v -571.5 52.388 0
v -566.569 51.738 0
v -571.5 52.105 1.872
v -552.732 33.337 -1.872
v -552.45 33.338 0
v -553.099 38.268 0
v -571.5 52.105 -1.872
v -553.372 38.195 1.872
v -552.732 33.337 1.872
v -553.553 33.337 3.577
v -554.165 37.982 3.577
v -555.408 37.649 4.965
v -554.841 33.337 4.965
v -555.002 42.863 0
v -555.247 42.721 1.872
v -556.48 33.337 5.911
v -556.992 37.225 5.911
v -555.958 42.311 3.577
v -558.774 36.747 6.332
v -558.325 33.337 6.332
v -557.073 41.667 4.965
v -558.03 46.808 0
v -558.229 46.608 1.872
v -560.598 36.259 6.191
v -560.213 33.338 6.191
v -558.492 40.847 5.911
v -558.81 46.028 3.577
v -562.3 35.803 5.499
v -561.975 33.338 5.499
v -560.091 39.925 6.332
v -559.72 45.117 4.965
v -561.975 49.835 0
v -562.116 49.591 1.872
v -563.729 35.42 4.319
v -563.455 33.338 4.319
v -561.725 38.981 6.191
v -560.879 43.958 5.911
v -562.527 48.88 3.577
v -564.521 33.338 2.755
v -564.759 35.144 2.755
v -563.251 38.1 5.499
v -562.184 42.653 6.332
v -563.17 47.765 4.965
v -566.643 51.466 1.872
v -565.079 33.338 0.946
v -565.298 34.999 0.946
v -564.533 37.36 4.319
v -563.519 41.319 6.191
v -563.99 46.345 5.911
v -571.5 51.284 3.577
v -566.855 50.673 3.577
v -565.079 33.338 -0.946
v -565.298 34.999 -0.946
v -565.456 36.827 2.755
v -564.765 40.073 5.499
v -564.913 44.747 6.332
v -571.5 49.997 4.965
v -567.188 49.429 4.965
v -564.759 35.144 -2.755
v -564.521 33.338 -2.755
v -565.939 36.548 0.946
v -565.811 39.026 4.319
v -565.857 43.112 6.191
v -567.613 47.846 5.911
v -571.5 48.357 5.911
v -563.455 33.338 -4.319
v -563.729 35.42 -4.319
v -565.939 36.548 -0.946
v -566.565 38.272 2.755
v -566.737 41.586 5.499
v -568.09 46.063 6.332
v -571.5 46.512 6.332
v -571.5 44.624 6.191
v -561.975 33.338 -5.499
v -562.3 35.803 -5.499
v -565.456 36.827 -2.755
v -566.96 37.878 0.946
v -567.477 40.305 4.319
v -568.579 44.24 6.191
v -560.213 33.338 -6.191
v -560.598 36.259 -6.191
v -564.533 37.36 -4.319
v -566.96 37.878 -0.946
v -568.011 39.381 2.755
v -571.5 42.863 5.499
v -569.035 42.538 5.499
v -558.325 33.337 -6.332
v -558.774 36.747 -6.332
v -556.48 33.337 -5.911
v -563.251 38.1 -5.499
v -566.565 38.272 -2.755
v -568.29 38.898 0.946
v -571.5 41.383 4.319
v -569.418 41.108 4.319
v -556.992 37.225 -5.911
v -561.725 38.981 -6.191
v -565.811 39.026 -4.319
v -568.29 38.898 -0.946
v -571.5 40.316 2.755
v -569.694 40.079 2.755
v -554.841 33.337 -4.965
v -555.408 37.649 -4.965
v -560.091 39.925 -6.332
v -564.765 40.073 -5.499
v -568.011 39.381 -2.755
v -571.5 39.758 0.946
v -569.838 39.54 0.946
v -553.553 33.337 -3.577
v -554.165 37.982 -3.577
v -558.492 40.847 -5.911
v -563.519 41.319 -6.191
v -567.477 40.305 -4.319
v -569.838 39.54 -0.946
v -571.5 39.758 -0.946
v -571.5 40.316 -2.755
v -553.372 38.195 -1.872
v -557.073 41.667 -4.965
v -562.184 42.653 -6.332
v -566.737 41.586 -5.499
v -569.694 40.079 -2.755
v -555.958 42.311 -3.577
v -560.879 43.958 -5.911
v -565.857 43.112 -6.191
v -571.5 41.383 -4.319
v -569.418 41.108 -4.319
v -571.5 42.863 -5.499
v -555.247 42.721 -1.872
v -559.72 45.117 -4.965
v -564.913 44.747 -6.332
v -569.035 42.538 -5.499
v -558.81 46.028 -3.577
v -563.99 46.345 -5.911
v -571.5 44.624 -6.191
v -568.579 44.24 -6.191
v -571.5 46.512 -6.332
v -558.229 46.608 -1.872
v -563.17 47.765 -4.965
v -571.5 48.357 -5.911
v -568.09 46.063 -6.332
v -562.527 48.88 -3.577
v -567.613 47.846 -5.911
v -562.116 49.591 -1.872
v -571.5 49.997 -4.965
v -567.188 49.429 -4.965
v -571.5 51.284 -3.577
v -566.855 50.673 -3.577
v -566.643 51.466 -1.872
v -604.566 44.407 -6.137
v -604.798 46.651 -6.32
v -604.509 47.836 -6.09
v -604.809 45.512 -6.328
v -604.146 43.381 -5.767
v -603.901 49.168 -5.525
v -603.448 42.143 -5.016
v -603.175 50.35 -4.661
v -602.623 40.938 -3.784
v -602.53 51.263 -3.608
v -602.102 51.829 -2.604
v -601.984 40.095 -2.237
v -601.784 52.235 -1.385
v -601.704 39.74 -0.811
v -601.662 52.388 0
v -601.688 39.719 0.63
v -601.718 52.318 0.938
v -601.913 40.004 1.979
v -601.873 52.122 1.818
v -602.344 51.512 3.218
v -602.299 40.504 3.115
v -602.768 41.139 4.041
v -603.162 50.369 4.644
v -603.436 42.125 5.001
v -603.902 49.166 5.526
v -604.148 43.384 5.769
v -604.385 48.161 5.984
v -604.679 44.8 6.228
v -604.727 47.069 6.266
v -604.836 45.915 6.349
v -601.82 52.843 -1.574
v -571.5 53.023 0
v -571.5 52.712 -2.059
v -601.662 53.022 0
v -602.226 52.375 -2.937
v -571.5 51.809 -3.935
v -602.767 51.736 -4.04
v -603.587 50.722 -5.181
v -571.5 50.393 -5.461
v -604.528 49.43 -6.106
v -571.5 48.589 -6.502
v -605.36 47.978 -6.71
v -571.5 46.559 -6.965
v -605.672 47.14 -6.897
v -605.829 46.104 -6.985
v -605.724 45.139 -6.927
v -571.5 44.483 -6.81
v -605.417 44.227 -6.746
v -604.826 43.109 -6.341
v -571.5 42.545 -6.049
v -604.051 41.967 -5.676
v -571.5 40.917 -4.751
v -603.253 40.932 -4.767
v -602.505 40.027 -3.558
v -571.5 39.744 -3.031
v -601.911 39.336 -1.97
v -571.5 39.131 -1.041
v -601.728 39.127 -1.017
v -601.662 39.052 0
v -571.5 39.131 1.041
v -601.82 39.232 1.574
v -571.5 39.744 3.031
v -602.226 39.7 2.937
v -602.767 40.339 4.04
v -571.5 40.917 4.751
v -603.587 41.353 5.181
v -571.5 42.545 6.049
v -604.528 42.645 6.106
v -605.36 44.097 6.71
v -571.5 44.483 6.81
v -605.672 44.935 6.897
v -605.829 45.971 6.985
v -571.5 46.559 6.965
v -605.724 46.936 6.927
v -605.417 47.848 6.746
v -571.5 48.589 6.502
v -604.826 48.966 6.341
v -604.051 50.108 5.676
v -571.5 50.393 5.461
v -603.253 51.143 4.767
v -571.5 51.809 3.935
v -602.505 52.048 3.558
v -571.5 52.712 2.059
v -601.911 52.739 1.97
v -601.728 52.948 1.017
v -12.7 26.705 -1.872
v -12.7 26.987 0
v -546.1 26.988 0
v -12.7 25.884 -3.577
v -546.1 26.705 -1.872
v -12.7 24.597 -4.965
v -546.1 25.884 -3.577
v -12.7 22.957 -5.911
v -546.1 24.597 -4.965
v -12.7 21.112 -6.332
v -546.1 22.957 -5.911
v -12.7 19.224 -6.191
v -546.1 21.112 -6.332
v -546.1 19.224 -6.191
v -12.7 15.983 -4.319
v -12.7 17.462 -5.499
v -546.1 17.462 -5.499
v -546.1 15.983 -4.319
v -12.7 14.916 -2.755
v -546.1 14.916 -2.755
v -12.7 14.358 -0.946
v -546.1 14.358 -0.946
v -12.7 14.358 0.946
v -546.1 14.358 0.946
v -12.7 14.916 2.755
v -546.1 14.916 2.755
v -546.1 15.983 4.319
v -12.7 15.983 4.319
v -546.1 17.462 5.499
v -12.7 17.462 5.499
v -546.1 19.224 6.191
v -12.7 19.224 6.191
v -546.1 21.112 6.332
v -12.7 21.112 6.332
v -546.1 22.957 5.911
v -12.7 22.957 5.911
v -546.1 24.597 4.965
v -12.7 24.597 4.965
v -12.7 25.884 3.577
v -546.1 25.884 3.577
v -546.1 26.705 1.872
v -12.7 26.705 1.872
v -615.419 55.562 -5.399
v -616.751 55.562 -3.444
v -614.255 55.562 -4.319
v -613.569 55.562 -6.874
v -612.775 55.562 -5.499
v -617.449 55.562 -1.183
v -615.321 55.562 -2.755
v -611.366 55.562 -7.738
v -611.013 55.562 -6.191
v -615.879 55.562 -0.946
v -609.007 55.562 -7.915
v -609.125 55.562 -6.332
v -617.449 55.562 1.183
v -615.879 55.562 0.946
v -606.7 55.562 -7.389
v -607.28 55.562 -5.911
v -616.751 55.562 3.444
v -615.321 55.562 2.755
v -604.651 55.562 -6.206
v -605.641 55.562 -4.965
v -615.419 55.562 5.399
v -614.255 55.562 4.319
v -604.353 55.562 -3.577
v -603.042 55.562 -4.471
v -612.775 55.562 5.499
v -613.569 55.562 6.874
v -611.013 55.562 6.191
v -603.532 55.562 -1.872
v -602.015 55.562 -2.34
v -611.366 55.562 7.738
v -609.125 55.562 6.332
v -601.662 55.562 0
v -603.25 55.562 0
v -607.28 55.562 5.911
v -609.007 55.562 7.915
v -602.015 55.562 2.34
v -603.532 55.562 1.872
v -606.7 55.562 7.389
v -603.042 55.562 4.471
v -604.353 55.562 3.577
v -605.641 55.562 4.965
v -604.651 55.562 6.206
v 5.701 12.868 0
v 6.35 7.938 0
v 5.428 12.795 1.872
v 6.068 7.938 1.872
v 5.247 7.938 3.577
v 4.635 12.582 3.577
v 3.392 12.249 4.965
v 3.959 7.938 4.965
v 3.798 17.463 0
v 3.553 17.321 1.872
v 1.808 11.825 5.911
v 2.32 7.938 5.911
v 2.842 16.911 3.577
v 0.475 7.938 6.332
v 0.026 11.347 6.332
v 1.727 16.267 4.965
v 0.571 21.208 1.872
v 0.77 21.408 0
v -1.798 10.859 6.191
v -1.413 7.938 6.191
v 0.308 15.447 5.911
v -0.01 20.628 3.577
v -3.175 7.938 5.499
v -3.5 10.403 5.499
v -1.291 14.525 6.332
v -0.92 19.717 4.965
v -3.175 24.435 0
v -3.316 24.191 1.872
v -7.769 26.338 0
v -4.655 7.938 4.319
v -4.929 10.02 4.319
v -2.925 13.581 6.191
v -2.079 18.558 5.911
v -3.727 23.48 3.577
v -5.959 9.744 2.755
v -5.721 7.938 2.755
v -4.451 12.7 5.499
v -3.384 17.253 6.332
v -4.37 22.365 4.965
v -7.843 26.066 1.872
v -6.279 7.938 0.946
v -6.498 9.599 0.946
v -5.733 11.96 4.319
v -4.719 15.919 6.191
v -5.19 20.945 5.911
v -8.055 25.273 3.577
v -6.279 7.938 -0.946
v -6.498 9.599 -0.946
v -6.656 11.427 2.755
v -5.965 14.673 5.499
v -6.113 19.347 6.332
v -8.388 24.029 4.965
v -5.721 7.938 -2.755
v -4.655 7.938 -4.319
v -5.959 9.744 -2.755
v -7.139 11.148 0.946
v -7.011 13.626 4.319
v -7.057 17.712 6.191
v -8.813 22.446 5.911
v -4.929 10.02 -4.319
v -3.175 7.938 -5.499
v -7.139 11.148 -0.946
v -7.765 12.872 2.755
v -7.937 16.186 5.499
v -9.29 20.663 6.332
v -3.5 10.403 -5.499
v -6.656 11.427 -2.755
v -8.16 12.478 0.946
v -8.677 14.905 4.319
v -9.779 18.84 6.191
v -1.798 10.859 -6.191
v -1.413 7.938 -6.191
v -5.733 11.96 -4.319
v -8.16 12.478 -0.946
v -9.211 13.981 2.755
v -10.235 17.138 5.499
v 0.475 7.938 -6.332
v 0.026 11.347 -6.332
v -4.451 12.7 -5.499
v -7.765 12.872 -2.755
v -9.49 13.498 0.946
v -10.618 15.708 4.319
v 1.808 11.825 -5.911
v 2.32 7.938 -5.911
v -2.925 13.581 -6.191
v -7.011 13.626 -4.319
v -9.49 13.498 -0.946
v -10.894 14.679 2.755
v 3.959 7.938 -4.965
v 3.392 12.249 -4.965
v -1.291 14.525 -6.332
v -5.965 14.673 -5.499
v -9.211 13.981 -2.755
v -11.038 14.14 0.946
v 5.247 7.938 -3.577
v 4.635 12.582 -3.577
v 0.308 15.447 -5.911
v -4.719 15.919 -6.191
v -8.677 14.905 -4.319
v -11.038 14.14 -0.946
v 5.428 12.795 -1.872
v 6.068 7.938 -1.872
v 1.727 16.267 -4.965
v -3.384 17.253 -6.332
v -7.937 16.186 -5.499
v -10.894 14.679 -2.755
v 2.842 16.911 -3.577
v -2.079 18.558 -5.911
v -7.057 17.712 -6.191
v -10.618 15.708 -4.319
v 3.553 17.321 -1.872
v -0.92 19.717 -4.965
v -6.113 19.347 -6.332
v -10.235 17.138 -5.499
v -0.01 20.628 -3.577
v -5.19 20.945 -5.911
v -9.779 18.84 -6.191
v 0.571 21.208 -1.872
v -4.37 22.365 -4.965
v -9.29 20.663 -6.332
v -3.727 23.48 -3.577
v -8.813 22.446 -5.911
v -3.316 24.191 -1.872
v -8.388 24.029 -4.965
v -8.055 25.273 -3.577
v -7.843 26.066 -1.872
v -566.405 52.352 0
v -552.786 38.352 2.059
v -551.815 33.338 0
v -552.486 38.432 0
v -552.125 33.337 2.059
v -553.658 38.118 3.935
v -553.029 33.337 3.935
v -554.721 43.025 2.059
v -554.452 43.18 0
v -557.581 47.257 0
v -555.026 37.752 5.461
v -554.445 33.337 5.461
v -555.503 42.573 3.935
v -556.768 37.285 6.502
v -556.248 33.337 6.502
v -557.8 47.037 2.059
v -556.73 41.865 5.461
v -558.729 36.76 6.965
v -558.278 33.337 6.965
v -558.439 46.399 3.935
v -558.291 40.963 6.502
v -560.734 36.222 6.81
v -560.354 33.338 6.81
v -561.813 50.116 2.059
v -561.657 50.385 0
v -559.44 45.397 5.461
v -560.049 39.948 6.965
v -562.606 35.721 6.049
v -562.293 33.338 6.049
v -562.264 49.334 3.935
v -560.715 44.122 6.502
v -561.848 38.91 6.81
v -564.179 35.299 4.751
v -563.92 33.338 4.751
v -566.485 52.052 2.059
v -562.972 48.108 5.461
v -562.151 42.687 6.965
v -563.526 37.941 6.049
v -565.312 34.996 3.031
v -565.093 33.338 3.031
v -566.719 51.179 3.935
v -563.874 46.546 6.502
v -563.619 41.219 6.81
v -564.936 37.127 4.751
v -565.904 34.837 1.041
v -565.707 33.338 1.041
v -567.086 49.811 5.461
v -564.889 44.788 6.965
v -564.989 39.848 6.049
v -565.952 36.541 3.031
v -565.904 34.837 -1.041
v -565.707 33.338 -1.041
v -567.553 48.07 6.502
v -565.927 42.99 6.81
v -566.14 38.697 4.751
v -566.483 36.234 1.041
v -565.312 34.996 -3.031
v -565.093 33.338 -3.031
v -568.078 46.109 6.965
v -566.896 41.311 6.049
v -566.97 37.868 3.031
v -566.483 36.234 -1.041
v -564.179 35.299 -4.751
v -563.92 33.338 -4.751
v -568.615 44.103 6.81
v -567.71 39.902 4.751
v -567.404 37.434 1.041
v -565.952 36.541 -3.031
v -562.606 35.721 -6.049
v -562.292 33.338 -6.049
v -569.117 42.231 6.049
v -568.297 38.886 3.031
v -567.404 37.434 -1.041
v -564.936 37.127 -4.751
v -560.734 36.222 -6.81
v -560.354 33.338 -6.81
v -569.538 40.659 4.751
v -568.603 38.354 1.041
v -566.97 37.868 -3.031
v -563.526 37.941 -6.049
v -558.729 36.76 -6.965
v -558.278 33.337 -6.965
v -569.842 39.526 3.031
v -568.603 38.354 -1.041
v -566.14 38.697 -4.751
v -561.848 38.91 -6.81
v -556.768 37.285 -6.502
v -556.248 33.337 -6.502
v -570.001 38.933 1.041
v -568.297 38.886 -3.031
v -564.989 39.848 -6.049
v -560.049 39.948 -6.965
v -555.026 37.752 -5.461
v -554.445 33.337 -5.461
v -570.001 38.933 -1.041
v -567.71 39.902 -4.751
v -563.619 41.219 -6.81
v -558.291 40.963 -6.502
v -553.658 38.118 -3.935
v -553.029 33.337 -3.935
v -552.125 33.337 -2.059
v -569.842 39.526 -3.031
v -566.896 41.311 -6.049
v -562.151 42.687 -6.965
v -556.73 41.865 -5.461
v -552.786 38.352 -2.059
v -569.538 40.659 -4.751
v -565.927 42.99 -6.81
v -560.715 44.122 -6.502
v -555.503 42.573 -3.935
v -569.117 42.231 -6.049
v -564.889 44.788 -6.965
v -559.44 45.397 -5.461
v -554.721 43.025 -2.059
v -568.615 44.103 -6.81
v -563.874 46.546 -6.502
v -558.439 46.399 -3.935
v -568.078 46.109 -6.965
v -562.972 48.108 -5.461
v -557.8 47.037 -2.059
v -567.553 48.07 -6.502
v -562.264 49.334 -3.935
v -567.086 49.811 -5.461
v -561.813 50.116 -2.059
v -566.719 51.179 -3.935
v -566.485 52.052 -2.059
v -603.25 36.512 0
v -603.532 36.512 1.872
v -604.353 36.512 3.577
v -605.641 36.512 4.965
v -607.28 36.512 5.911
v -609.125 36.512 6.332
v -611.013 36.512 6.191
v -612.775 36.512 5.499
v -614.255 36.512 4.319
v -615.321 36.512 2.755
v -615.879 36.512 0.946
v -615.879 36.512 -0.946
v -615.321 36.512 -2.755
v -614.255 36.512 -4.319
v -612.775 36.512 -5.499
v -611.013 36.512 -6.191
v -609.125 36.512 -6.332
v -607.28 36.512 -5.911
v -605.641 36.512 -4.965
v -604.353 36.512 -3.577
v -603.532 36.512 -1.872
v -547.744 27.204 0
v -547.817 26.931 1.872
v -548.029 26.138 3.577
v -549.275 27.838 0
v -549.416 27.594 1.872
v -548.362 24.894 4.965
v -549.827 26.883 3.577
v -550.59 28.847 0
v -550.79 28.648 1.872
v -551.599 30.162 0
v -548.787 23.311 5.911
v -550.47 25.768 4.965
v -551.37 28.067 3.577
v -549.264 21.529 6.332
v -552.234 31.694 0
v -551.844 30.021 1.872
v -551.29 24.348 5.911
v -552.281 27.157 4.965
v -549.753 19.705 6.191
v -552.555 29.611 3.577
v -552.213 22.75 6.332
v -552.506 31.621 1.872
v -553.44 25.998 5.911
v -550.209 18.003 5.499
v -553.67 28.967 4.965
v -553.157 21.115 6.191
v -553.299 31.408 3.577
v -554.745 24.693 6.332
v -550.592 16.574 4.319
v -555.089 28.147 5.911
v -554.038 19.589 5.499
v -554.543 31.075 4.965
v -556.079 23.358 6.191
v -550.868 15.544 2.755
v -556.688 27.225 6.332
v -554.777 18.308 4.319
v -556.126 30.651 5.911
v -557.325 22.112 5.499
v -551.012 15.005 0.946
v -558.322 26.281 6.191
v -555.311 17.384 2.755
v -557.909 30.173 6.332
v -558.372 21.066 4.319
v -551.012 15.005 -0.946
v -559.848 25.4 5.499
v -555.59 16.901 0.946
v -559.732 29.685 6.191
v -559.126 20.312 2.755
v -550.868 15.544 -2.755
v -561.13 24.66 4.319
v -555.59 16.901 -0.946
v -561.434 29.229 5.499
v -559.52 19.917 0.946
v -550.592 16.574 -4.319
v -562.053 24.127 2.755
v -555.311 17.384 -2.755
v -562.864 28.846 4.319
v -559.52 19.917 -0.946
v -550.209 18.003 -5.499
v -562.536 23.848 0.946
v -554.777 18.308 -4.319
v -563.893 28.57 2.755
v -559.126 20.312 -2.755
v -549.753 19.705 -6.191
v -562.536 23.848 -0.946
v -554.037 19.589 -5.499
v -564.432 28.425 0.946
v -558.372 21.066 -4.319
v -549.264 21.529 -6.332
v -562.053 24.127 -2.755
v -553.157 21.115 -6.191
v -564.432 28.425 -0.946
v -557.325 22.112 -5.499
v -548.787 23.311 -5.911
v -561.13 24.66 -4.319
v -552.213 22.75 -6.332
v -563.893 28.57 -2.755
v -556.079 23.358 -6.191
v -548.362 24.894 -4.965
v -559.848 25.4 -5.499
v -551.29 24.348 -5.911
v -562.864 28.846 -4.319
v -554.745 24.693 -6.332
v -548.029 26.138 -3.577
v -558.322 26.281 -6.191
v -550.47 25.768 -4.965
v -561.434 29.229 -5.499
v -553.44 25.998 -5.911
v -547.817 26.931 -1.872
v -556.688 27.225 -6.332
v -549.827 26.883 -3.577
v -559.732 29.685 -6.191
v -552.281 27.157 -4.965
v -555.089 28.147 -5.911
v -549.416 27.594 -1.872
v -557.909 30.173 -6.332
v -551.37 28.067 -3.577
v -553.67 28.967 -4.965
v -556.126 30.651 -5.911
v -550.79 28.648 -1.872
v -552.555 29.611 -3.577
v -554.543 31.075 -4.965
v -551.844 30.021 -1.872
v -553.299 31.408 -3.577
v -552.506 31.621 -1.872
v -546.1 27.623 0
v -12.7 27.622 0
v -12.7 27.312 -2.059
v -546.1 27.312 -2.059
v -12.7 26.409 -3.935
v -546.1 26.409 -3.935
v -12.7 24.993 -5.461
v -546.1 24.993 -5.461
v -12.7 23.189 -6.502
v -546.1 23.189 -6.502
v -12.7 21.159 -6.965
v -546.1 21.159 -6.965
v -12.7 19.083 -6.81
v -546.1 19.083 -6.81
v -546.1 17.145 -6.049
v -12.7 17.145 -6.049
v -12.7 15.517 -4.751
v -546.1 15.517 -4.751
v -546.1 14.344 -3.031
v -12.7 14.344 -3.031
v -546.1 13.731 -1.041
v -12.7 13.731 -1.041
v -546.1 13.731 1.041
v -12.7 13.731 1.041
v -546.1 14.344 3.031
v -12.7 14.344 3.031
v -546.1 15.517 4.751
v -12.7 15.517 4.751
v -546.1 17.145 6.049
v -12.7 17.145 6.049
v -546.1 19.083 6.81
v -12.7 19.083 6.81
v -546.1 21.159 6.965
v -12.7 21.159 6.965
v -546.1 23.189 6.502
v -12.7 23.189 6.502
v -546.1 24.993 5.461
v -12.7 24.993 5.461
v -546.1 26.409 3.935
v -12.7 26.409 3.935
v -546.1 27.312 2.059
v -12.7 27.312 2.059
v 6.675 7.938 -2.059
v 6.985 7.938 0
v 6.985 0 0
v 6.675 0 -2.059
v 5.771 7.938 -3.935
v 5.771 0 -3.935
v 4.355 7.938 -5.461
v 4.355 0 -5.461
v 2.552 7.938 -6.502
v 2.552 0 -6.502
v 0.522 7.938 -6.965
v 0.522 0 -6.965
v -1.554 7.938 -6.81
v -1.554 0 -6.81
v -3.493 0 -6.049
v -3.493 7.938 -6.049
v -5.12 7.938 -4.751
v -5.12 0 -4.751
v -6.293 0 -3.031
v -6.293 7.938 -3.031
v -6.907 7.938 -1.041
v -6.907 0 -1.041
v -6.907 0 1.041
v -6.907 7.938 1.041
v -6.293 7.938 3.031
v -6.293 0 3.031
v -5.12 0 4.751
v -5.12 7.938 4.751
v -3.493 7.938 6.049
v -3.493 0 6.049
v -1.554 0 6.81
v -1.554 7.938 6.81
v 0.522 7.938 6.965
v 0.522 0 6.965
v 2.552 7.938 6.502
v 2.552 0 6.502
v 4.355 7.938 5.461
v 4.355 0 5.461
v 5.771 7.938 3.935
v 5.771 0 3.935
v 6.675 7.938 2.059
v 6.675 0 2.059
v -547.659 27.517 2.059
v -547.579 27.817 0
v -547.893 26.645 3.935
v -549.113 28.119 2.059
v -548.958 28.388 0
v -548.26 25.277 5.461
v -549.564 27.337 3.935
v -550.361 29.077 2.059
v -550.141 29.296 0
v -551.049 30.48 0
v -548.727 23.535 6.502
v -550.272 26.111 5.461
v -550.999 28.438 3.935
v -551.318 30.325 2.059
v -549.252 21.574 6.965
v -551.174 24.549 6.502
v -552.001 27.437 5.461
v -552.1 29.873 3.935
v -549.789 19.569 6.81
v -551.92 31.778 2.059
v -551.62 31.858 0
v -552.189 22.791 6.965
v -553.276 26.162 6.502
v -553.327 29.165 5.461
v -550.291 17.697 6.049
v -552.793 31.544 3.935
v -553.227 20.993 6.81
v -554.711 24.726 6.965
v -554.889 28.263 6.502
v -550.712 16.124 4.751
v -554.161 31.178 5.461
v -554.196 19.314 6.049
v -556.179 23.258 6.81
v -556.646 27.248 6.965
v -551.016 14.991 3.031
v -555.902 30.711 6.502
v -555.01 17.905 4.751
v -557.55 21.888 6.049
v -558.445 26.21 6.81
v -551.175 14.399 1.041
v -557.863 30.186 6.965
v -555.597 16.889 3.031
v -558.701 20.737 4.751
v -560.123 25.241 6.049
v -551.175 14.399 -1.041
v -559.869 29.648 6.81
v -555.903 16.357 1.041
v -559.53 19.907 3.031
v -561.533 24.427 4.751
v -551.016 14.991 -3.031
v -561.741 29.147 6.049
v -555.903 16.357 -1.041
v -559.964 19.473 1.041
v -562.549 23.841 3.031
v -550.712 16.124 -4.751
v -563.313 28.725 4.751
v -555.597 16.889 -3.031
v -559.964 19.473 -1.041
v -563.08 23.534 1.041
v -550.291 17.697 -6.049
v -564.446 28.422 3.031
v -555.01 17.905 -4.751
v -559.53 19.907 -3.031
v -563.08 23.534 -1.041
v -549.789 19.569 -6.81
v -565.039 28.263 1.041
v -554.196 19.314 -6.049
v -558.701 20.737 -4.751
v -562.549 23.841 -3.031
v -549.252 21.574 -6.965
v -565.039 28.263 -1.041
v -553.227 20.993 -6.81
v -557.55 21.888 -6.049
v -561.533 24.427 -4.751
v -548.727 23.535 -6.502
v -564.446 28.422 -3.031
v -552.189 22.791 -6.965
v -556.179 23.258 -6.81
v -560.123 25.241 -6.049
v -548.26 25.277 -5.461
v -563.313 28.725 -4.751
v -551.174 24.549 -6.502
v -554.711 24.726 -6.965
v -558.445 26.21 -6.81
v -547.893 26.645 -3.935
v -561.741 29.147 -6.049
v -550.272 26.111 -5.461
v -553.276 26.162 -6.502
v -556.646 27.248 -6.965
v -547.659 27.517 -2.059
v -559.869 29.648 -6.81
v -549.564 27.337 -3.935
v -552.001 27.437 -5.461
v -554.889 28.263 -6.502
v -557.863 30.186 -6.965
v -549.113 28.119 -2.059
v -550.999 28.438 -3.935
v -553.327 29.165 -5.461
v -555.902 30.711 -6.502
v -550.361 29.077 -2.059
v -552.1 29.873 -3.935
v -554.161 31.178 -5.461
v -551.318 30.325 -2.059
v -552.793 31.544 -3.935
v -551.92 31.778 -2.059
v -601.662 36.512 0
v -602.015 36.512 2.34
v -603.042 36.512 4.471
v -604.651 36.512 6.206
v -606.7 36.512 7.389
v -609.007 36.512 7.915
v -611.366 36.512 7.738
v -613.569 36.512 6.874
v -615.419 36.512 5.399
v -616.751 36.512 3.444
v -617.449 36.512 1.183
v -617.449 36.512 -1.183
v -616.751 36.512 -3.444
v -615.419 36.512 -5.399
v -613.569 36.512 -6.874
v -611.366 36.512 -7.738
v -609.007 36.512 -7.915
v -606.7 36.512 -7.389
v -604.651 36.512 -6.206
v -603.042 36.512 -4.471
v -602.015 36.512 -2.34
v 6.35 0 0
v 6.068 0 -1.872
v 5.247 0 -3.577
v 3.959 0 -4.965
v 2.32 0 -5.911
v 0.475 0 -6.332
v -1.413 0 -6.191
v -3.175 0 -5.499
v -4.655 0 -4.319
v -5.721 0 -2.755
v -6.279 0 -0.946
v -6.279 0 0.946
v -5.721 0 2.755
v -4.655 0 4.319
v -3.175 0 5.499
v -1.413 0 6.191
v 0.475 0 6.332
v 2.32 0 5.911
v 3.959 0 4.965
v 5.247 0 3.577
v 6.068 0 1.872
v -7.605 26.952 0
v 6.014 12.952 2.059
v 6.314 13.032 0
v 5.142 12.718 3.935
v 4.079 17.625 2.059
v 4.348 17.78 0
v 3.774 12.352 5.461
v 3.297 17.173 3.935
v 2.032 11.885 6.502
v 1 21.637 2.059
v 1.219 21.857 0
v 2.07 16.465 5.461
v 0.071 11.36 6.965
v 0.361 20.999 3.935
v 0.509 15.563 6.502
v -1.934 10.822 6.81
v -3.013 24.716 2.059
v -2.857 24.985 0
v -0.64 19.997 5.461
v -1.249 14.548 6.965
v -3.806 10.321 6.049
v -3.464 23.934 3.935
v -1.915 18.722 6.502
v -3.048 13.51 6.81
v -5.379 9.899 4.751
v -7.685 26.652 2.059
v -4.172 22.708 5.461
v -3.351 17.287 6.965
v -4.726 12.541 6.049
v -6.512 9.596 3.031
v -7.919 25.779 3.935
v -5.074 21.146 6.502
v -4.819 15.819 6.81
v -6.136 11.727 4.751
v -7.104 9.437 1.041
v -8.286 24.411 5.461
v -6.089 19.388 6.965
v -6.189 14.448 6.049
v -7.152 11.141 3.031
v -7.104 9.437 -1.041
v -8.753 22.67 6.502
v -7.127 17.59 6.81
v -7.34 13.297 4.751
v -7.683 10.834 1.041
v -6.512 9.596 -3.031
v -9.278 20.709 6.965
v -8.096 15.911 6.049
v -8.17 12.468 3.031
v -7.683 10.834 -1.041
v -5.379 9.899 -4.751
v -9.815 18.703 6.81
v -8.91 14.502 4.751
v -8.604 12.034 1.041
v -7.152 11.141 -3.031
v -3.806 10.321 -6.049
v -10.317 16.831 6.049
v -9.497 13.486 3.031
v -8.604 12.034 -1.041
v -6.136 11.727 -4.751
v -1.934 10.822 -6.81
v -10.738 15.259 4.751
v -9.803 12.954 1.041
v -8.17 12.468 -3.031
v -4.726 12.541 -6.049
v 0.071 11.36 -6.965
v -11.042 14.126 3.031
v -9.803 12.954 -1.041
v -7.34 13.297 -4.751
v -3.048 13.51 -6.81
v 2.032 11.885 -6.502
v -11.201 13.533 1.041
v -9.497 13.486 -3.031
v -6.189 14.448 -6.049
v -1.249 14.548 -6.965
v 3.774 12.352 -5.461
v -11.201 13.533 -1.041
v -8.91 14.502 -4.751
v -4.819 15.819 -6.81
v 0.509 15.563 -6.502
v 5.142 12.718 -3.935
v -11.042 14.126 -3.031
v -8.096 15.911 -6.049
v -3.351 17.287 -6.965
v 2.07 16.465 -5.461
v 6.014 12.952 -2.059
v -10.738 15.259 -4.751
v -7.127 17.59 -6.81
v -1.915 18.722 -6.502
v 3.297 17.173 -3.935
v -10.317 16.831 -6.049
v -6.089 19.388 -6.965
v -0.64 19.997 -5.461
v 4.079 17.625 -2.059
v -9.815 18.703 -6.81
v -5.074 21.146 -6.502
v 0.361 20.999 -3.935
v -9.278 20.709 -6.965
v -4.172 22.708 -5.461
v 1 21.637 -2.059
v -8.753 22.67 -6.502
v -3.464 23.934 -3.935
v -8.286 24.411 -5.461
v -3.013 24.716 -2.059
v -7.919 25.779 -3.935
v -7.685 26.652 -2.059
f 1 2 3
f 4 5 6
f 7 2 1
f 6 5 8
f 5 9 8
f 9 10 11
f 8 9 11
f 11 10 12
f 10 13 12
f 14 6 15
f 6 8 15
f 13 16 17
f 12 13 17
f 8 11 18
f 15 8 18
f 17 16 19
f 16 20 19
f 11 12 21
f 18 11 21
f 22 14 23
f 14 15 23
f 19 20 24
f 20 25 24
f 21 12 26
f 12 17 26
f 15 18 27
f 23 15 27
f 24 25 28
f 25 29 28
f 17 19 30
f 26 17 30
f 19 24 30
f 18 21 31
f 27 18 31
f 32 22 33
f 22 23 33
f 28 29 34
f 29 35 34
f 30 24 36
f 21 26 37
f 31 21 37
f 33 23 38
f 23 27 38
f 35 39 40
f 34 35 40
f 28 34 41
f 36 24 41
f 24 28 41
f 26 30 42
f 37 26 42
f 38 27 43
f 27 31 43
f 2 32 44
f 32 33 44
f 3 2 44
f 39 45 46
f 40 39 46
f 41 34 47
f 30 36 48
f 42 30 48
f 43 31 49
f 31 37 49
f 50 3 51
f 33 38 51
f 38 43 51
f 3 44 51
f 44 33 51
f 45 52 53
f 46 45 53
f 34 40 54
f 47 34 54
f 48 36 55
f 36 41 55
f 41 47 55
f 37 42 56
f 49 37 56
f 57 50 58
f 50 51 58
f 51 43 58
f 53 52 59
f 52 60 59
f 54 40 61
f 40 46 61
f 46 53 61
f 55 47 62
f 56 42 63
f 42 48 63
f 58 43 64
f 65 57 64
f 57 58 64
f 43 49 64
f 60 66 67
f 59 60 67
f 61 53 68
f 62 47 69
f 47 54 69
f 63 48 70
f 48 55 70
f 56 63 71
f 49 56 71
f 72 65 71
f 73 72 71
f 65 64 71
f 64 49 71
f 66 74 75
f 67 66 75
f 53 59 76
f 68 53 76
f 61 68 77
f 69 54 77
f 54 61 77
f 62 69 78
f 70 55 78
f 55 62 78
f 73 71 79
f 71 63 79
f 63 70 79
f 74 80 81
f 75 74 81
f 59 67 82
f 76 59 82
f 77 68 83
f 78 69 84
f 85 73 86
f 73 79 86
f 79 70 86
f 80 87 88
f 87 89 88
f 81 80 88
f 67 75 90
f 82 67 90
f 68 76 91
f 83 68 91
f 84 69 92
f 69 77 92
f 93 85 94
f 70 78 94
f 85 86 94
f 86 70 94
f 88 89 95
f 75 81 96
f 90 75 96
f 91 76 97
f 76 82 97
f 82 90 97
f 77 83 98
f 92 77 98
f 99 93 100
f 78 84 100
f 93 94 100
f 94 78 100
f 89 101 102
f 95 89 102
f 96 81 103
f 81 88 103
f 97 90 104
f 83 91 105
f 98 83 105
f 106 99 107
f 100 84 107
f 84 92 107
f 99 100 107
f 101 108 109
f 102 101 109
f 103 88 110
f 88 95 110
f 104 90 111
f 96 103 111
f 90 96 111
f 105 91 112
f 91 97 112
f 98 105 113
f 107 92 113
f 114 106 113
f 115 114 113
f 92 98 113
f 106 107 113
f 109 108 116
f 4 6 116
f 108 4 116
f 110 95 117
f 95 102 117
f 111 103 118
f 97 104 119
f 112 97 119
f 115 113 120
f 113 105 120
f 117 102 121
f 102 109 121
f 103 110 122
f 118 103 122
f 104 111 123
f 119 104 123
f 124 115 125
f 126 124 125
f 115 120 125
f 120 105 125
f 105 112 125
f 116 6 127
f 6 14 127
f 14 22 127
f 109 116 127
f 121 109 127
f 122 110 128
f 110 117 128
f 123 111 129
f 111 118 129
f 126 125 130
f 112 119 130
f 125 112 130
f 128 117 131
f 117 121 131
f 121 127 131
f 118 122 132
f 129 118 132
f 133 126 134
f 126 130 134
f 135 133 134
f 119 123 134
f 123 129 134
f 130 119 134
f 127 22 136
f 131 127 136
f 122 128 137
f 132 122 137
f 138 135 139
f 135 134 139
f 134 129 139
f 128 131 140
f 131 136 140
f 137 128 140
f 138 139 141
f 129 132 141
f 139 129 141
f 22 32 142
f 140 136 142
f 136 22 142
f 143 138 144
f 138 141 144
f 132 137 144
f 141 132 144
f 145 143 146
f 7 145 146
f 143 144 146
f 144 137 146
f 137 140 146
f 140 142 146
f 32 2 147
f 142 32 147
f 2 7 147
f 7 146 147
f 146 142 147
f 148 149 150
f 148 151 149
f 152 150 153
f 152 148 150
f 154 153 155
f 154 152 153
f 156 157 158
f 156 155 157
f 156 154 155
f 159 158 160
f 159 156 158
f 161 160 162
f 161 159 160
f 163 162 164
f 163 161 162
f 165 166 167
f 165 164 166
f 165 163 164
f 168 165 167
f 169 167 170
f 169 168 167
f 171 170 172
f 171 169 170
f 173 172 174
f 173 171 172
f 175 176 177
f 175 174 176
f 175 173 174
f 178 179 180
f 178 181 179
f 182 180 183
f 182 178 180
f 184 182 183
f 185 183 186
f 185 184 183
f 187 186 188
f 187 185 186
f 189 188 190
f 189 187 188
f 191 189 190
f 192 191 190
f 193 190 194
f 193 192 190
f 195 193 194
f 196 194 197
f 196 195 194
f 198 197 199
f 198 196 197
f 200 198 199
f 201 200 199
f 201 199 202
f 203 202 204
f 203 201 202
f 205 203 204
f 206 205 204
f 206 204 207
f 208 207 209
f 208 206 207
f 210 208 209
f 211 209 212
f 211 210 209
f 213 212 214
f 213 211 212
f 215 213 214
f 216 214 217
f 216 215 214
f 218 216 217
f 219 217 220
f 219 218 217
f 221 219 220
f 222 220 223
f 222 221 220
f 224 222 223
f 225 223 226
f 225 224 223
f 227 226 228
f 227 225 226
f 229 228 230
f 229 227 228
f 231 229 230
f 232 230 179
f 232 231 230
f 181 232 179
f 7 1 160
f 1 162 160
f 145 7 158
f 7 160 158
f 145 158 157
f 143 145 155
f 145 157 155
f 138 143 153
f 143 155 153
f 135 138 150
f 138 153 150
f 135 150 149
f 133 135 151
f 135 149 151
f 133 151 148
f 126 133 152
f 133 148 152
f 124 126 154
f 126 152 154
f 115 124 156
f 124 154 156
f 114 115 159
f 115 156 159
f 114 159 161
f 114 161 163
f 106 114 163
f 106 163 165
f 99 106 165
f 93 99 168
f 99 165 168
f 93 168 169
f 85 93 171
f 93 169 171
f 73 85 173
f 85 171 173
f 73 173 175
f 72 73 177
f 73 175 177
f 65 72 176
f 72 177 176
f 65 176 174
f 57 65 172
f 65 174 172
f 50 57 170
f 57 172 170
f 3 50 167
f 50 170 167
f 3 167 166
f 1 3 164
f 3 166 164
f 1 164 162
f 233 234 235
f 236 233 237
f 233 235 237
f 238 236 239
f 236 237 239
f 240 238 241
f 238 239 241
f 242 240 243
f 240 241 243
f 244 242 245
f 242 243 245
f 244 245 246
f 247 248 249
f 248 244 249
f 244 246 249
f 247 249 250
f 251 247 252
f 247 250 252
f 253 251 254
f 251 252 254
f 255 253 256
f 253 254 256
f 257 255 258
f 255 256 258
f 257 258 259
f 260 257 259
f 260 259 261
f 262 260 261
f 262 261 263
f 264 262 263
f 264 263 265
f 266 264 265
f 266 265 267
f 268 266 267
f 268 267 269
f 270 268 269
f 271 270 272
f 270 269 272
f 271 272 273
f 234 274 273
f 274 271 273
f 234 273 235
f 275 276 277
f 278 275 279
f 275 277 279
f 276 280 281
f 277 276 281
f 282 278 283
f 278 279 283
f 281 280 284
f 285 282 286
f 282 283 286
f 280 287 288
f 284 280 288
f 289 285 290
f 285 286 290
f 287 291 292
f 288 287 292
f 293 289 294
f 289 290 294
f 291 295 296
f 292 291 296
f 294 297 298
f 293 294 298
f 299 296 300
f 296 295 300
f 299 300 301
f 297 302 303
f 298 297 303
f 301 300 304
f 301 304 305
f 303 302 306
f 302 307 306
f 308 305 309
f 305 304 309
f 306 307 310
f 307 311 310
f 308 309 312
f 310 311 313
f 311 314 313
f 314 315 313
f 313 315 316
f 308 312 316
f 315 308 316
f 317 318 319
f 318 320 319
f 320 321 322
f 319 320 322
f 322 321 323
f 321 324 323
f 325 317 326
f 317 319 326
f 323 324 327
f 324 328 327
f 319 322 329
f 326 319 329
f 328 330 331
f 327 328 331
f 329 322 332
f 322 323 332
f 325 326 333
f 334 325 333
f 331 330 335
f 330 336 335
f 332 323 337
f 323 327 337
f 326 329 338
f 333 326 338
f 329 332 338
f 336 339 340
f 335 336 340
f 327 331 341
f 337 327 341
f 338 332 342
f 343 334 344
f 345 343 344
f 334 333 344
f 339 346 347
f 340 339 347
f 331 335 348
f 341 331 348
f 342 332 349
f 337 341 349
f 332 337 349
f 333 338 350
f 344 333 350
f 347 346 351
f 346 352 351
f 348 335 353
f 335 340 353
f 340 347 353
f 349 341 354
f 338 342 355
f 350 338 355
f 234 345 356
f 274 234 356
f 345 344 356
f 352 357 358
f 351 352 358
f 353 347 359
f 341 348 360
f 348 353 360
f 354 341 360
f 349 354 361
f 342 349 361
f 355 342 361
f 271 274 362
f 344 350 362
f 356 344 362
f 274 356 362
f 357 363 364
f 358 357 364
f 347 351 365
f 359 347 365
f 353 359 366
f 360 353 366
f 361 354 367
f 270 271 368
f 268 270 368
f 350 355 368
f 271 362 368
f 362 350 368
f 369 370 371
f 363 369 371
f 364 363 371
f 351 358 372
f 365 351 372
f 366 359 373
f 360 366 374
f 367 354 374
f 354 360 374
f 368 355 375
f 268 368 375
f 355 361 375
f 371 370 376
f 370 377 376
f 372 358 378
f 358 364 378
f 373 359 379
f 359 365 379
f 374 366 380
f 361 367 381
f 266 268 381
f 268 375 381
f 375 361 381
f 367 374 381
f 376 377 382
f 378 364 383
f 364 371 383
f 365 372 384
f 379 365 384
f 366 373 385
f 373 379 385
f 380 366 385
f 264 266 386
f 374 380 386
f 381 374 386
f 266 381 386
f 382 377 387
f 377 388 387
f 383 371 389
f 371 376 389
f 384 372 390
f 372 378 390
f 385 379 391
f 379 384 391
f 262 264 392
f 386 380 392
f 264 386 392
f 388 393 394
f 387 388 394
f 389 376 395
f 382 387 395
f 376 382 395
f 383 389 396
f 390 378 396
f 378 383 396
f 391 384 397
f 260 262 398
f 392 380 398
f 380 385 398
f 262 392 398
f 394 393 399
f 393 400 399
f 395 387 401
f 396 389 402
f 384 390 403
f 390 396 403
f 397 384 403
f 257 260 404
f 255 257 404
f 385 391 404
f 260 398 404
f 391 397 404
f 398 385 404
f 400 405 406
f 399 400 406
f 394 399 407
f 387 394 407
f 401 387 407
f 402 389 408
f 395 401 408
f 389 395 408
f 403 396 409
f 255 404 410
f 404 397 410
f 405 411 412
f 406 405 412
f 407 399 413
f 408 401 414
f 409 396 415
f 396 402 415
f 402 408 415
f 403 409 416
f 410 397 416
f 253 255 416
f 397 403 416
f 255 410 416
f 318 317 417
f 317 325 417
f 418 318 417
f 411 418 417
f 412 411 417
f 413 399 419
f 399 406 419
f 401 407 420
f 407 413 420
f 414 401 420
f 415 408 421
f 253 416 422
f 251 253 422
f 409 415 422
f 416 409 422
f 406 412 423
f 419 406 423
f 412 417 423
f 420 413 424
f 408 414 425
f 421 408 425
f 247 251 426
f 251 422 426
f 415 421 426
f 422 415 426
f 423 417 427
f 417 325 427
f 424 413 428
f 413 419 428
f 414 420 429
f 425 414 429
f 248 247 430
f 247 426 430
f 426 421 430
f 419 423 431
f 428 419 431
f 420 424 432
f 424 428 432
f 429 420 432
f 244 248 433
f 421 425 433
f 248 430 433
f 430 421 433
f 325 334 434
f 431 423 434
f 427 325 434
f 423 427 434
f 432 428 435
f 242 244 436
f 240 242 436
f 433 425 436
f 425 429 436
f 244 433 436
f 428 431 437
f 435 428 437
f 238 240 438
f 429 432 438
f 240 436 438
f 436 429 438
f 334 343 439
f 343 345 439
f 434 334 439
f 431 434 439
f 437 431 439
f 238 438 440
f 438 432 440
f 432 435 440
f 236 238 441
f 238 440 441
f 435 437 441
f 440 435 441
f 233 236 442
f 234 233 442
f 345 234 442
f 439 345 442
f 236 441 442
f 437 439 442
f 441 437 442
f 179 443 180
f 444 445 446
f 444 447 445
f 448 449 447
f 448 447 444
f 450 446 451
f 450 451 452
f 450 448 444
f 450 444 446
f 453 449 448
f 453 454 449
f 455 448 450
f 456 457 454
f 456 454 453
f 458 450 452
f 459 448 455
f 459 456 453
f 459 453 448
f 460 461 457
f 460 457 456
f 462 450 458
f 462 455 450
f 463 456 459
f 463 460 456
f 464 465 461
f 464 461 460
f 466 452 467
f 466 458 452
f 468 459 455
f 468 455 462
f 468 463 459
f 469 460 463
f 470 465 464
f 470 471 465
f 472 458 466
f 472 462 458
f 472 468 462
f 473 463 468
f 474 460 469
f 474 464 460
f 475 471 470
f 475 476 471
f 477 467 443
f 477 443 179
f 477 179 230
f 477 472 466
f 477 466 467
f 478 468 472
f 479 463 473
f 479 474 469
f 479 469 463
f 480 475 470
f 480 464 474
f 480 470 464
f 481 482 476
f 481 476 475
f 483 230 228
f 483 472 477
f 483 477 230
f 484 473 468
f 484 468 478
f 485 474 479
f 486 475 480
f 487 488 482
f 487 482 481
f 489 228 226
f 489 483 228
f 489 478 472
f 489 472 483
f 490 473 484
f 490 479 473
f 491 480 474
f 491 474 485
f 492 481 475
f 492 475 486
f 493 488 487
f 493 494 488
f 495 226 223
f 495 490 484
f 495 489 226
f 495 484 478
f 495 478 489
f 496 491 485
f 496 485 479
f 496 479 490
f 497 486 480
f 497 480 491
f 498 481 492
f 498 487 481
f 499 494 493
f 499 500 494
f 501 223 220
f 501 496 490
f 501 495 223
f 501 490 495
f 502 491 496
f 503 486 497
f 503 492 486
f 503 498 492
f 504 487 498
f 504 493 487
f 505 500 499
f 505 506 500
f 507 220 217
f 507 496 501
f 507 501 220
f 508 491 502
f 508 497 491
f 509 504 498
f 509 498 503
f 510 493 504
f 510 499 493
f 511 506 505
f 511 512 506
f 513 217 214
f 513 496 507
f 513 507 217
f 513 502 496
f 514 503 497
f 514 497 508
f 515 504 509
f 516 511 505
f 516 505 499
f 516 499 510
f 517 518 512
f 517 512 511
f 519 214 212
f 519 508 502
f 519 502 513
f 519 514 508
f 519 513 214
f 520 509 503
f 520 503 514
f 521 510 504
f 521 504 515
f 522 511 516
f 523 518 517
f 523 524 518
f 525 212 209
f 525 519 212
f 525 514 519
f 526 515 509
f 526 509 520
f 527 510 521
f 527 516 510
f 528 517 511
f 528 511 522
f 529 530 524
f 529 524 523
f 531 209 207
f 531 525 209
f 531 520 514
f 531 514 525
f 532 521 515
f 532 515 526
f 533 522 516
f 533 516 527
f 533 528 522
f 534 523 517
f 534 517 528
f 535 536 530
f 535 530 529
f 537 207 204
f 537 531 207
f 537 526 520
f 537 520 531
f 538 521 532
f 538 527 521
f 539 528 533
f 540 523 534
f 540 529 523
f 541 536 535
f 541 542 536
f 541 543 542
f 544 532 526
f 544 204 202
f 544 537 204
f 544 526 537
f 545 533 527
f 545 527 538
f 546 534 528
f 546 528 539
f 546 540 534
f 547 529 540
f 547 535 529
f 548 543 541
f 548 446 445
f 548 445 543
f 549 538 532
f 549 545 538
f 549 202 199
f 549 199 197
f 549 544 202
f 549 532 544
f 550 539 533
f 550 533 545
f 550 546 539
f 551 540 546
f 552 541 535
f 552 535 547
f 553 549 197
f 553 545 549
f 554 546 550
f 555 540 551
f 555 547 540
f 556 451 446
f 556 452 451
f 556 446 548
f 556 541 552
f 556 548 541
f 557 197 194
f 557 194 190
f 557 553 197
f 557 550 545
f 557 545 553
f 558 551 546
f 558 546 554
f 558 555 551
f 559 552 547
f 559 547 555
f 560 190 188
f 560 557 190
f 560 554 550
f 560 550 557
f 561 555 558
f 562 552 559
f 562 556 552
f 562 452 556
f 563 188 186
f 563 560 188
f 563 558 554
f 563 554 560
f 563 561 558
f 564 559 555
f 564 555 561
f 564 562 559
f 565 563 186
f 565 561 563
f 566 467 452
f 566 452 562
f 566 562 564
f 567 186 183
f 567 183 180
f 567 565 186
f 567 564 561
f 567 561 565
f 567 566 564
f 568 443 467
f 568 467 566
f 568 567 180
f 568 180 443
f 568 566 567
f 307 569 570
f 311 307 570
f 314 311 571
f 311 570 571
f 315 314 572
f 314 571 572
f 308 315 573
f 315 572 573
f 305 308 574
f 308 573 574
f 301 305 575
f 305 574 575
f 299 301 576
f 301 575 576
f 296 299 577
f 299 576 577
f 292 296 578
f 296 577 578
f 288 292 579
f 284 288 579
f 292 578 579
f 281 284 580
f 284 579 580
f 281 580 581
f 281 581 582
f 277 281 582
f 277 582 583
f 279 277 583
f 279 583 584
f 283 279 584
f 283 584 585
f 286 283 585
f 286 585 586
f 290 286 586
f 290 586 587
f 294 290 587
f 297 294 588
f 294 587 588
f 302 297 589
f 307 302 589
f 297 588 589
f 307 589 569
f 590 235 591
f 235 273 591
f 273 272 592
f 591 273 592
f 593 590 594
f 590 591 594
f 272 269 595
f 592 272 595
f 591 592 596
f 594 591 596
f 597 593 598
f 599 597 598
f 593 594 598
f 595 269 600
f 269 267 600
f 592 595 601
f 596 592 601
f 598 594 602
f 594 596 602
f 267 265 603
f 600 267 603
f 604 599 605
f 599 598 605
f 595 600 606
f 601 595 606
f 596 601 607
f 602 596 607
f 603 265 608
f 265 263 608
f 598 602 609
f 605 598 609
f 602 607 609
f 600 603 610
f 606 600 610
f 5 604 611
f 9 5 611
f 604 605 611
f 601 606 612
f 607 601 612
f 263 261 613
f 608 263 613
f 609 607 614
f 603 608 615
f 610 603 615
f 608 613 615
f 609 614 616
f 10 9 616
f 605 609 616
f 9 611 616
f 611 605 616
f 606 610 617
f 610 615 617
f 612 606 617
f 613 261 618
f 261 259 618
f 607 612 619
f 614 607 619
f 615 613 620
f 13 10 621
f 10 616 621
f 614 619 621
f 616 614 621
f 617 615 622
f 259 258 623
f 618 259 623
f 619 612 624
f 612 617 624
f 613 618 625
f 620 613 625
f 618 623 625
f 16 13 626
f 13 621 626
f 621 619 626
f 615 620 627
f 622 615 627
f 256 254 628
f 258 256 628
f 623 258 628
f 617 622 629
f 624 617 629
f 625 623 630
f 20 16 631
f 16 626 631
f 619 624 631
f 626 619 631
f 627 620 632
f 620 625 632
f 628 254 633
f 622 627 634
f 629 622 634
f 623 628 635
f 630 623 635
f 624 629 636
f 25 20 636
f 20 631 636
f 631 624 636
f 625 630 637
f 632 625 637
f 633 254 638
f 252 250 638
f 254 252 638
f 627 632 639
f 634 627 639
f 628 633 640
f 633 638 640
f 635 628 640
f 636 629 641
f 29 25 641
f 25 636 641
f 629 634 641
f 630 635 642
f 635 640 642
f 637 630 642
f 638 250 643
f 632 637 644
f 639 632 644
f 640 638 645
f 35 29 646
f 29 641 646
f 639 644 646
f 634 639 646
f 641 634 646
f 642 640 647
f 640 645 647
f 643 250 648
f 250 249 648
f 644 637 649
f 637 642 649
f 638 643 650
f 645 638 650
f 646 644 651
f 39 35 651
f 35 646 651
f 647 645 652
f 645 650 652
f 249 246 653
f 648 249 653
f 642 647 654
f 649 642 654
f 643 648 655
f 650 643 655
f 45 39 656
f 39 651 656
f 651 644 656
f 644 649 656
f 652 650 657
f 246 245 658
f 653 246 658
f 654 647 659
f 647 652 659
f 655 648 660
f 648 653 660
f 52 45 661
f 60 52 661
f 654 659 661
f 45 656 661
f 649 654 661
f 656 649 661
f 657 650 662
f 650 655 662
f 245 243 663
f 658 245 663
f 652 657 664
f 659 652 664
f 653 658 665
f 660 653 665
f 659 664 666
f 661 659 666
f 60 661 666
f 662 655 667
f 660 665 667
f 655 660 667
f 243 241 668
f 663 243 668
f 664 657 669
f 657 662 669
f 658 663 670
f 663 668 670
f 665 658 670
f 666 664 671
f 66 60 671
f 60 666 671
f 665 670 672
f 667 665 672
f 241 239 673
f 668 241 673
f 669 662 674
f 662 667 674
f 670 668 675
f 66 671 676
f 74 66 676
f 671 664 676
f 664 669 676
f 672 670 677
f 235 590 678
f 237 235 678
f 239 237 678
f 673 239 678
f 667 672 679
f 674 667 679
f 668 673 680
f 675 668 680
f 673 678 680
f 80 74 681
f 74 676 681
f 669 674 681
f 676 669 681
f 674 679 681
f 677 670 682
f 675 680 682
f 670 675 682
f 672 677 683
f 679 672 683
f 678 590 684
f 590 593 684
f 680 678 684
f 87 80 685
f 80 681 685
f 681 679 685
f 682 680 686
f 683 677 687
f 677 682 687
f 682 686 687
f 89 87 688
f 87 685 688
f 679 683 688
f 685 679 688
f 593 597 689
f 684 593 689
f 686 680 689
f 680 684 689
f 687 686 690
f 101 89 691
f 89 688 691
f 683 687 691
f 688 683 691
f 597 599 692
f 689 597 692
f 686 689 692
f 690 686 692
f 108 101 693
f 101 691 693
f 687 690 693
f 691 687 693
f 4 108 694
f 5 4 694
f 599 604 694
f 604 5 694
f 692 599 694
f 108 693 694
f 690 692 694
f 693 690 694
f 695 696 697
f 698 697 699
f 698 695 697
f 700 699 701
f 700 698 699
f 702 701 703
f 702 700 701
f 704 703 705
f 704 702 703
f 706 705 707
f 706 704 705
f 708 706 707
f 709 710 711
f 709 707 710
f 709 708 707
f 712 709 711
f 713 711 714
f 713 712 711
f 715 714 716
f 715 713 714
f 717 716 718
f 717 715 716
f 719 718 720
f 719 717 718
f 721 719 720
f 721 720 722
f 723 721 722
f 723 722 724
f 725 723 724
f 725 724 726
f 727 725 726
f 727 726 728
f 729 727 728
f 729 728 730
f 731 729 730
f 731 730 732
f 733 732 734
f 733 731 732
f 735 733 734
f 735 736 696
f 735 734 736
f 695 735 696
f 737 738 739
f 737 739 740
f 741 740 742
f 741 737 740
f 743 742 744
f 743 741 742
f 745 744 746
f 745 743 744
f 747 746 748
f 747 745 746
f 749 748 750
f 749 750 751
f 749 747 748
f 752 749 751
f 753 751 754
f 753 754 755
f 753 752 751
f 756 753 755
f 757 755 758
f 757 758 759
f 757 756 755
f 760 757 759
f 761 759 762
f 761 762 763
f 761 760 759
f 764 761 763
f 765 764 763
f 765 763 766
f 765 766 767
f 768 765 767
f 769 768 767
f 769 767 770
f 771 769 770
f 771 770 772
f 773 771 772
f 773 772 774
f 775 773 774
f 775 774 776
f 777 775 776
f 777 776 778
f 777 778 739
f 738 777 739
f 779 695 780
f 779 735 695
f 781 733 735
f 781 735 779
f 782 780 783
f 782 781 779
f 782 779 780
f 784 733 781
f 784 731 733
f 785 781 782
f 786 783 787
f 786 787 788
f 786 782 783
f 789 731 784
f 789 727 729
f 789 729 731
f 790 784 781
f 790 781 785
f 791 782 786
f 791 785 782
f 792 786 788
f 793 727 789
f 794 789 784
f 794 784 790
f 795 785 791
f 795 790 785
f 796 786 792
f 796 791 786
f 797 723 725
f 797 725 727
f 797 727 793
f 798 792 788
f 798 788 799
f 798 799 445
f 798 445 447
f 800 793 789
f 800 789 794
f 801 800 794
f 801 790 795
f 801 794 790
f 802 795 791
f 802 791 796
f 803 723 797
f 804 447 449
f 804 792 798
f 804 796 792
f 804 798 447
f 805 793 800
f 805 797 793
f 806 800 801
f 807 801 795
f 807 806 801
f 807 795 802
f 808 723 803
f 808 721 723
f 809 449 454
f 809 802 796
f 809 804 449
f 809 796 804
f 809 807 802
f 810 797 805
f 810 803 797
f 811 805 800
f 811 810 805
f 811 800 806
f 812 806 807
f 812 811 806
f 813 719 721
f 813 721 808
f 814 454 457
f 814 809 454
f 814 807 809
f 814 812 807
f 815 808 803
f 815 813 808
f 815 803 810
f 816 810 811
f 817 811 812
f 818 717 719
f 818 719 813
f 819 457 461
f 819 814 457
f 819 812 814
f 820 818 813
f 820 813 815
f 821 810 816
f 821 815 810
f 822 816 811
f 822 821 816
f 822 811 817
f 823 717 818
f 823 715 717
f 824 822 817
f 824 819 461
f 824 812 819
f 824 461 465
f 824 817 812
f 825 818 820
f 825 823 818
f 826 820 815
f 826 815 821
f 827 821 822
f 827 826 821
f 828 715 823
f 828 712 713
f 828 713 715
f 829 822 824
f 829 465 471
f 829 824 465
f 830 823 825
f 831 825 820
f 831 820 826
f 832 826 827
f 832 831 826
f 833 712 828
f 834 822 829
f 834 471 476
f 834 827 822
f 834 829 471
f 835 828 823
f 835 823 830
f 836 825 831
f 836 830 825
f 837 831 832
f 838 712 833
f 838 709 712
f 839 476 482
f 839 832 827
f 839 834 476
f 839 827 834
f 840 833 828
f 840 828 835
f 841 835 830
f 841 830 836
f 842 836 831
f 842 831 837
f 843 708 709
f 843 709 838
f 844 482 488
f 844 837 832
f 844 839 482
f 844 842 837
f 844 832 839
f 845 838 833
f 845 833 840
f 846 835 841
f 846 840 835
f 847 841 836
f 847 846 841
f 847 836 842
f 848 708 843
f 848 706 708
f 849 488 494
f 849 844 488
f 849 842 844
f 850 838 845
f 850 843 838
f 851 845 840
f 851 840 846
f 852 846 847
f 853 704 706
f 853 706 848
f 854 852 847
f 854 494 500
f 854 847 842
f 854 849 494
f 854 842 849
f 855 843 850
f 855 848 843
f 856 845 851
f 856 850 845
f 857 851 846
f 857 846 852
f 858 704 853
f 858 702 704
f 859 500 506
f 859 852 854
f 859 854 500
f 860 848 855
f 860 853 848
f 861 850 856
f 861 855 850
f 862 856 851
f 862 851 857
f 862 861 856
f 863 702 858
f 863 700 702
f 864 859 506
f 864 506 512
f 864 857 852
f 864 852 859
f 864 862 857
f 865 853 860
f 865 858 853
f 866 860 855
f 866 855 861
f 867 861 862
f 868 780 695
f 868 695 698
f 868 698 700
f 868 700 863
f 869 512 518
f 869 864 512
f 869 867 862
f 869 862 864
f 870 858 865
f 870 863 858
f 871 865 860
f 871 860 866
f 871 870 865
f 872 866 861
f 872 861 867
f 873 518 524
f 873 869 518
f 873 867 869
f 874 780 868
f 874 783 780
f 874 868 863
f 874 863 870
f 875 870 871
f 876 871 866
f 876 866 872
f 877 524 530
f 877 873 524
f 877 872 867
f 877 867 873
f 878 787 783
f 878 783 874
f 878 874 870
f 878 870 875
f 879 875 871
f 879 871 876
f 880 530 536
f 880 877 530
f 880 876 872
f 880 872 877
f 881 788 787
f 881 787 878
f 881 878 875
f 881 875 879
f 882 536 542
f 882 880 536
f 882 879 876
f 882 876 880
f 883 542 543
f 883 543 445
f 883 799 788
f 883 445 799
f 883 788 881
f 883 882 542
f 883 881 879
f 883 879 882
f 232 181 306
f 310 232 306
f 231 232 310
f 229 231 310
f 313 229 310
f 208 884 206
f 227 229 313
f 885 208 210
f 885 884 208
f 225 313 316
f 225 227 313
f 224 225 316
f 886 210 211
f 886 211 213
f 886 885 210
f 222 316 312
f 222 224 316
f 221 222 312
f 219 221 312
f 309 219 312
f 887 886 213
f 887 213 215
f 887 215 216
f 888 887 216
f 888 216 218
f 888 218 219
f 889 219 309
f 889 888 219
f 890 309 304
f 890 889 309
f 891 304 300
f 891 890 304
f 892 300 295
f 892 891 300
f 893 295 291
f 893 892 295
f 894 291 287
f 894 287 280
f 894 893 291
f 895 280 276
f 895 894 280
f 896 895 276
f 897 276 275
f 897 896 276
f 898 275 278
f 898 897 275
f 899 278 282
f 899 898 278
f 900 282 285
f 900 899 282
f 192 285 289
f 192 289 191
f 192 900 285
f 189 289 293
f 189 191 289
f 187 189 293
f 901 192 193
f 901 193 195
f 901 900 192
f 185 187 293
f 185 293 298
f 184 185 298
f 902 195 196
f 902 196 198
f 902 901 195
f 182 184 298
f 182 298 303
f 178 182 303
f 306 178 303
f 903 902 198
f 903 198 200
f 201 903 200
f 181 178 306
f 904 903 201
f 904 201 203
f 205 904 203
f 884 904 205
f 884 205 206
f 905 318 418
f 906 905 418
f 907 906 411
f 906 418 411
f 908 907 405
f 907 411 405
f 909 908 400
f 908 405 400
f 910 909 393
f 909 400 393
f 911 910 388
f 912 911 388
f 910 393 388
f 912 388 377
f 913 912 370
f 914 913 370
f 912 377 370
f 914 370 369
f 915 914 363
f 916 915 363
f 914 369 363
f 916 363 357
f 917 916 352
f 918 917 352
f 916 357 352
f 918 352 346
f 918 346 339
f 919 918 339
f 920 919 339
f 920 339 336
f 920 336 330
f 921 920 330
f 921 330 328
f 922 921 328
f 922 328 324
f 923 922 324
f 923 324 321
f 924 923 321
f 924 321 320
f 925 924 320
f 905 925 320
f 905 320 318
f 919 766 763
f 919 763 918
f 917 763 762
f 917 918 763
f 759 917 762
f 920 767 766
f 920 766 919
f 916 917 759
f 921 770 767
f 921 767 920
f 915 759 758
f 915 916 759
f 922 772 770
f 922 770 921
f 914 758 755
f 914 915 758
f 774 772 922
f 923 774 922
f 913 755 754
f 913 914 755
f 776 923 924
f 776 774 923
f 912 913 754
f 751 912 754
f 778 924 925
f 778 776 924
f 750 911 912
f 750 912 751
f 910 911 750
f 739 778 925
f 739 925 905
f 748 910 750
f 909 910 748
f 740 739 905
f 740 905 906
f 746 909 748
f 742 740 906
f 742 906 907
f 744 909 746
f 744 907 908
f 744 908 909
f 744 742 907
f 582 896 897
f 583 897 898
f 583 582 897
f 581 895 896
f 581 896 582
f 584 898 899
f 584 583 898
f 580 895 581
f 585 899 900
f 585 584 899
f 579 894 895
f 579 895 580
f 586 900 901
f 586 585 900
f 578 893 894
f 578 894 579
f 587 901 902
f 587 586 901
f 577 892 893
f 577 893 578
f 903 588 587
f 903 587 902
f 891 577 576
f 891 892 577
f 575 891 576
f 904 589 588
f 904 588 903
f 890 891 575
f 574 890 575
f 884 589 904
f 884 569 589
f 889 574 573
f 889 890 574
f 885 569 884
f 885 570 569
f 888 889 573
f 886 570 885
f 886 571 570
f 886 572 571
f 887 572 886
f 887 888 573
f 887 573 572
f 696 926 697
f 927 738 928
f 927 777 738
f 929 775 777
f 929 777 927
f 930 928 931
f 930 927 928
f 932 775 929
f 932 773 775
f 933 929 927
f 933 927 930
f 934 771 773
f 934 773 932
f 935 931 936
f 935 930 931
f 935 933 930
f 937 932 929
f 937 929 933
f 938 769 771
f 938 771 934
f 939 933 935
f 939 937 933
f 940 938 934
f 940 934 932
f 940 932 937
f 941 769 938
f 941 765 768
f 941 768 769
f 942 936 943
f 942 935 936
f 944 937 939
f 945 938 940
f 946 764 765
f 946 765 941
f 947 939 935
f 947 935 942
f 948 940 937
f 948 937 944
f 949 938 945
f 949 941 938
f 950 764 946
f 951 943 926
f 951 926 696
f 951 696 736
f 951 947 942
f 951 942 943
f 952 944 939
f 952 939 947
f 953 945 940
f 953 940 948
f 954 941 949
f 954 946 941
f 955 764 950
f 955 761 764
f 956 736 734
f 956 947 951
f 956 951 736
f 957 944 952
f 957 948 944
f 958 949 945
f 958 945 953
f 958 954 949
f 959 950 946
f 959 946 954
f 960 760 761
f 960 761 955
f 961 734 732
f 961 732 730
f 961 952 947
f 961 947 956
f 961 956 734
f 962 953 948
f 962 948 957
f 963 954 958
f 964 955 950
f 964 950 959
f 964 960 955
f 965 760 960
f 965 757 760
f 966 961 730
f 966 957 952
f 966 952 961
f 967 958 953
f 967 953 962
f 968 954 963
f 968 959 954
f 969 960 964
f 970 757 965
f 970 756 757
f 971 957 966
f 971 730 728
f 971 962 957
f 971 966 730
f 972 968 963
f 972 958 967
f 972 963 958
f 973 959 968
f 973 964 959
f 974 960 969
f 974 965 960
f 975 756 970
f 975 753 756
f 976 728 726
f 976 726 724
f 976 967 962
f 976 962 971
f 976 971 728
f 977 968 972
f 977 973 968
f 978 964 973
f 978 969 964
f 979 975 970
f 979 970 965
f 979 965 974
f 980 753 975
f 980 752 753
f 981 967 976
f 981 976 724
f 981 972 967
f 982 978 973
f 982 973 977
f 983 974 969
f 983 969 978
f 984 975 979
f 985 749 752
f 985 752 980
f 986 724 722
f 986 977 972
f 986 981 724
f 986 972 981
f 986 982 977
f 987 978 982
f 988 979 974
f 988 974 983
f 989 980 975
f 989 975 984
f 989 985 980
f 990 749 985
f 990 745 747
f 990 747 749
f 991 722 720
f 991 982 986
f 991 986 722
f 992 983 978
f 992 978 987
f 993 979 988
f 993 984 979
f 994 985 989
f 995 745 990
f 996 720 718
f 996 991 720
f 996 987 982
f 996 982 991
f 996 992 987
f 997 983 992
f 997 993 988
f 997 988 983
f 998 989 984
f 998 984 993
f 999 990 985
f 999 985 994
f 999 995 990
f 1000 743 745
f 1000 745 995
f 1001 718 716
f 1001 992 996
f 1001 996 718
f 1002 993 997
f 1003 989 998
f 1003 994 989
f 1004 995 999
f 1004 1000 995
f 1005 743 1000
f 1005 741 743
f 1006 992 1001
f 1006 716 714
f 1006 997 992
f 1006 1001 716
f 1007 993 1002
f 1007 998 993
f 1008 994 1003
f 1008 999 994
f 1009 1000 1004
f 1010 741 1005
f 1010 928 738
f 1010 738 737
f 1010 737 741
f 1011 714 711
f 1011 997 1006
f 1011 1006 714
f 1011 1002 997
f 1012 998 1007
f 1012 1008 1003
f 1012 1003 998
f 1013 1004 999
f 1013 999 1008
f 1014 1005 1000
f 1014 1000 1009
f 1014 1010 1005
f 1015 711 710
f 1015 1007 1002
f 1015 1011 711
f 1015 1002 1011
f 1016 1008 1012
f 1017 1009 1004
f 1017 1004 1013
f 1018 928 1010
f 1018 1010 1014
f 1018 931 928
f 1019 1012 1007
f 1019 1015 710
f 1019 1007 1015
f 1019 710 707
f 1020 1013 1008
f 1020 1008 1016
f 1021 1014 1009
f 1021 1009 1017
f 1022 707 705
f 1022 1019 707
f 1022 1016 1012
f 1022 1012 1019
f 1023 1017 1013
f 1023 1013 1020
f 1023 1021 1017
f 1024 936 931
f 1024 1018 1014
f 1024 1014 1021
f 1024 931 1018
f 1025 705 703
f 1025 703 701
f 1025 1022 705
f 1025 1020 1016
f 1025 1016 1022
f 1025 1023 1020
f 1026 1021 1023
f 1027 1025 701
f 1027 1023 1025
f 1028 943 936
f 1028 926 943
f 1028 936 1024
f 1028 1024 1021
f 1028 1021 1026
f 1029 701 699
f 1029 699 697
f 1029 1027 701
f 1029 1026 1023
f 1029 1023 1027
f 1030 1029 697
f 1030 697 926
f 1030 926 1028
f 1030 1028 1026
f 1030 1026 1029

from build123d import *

# Parameters (mm, degrees)
F0_R     = 6.985
F0_R_2   = 6.35
F4_R     = 7.9375
F5_DEPTH = 9.525
F6_R     = 6.35
F7_DEPTH = 19.05


with BuildPart() as f2:
    # F2: sweep along a path in F1
    with BuildLine(Plane.XY) as f2_path:
        Line((0, 0), (0, 7.9375))
        ThreePointArc((0, 7.9375), (-3.7197438789, 16.9177561211), (-12.7, 20.6375))
        Line((-12.7, 20.6375), (-546.1, 20.6375))
        ThreePointArc((-546.1, 20.6375), (-555.0802561211, 24.3572438789), (-558.8, 33.3375))
        ThreePointArc((-558.8, 33.3375), (-562.5197438789, 42.3177561211), (-571.5, 46.0375))
        Line((-571.5, 46.0375), (-609.6, 46.0375))
    # F0 (on Front) → F2 (sweep)
    with BuildSketch(Plane.XZ):
        Circle(F0_R)
        Circle(F0_R_2, mode=Mode.SUBTRACT)
    sweep(path=f2_path.line)

    # F4 (on offset) → F5 (join, symmetric)
    with BuildSketch(Plane.XZ.offset(-46.0375)):
        with Locations((-609.6, 0)):
            Circle(F4_R)
    extrude(amount=F5_DEPTH, both=True)

    # F6 (on face) → F7 (cut, through all)
    with BuildSketch(Plane.XZ.offset(-36.5125)):
        with Locations((-609.6, 0)):
            Circle(F6_R)
    extrude(amount=-F7_DEPTH, mode=Mode.SUBTRACT)


solid = f2.part
